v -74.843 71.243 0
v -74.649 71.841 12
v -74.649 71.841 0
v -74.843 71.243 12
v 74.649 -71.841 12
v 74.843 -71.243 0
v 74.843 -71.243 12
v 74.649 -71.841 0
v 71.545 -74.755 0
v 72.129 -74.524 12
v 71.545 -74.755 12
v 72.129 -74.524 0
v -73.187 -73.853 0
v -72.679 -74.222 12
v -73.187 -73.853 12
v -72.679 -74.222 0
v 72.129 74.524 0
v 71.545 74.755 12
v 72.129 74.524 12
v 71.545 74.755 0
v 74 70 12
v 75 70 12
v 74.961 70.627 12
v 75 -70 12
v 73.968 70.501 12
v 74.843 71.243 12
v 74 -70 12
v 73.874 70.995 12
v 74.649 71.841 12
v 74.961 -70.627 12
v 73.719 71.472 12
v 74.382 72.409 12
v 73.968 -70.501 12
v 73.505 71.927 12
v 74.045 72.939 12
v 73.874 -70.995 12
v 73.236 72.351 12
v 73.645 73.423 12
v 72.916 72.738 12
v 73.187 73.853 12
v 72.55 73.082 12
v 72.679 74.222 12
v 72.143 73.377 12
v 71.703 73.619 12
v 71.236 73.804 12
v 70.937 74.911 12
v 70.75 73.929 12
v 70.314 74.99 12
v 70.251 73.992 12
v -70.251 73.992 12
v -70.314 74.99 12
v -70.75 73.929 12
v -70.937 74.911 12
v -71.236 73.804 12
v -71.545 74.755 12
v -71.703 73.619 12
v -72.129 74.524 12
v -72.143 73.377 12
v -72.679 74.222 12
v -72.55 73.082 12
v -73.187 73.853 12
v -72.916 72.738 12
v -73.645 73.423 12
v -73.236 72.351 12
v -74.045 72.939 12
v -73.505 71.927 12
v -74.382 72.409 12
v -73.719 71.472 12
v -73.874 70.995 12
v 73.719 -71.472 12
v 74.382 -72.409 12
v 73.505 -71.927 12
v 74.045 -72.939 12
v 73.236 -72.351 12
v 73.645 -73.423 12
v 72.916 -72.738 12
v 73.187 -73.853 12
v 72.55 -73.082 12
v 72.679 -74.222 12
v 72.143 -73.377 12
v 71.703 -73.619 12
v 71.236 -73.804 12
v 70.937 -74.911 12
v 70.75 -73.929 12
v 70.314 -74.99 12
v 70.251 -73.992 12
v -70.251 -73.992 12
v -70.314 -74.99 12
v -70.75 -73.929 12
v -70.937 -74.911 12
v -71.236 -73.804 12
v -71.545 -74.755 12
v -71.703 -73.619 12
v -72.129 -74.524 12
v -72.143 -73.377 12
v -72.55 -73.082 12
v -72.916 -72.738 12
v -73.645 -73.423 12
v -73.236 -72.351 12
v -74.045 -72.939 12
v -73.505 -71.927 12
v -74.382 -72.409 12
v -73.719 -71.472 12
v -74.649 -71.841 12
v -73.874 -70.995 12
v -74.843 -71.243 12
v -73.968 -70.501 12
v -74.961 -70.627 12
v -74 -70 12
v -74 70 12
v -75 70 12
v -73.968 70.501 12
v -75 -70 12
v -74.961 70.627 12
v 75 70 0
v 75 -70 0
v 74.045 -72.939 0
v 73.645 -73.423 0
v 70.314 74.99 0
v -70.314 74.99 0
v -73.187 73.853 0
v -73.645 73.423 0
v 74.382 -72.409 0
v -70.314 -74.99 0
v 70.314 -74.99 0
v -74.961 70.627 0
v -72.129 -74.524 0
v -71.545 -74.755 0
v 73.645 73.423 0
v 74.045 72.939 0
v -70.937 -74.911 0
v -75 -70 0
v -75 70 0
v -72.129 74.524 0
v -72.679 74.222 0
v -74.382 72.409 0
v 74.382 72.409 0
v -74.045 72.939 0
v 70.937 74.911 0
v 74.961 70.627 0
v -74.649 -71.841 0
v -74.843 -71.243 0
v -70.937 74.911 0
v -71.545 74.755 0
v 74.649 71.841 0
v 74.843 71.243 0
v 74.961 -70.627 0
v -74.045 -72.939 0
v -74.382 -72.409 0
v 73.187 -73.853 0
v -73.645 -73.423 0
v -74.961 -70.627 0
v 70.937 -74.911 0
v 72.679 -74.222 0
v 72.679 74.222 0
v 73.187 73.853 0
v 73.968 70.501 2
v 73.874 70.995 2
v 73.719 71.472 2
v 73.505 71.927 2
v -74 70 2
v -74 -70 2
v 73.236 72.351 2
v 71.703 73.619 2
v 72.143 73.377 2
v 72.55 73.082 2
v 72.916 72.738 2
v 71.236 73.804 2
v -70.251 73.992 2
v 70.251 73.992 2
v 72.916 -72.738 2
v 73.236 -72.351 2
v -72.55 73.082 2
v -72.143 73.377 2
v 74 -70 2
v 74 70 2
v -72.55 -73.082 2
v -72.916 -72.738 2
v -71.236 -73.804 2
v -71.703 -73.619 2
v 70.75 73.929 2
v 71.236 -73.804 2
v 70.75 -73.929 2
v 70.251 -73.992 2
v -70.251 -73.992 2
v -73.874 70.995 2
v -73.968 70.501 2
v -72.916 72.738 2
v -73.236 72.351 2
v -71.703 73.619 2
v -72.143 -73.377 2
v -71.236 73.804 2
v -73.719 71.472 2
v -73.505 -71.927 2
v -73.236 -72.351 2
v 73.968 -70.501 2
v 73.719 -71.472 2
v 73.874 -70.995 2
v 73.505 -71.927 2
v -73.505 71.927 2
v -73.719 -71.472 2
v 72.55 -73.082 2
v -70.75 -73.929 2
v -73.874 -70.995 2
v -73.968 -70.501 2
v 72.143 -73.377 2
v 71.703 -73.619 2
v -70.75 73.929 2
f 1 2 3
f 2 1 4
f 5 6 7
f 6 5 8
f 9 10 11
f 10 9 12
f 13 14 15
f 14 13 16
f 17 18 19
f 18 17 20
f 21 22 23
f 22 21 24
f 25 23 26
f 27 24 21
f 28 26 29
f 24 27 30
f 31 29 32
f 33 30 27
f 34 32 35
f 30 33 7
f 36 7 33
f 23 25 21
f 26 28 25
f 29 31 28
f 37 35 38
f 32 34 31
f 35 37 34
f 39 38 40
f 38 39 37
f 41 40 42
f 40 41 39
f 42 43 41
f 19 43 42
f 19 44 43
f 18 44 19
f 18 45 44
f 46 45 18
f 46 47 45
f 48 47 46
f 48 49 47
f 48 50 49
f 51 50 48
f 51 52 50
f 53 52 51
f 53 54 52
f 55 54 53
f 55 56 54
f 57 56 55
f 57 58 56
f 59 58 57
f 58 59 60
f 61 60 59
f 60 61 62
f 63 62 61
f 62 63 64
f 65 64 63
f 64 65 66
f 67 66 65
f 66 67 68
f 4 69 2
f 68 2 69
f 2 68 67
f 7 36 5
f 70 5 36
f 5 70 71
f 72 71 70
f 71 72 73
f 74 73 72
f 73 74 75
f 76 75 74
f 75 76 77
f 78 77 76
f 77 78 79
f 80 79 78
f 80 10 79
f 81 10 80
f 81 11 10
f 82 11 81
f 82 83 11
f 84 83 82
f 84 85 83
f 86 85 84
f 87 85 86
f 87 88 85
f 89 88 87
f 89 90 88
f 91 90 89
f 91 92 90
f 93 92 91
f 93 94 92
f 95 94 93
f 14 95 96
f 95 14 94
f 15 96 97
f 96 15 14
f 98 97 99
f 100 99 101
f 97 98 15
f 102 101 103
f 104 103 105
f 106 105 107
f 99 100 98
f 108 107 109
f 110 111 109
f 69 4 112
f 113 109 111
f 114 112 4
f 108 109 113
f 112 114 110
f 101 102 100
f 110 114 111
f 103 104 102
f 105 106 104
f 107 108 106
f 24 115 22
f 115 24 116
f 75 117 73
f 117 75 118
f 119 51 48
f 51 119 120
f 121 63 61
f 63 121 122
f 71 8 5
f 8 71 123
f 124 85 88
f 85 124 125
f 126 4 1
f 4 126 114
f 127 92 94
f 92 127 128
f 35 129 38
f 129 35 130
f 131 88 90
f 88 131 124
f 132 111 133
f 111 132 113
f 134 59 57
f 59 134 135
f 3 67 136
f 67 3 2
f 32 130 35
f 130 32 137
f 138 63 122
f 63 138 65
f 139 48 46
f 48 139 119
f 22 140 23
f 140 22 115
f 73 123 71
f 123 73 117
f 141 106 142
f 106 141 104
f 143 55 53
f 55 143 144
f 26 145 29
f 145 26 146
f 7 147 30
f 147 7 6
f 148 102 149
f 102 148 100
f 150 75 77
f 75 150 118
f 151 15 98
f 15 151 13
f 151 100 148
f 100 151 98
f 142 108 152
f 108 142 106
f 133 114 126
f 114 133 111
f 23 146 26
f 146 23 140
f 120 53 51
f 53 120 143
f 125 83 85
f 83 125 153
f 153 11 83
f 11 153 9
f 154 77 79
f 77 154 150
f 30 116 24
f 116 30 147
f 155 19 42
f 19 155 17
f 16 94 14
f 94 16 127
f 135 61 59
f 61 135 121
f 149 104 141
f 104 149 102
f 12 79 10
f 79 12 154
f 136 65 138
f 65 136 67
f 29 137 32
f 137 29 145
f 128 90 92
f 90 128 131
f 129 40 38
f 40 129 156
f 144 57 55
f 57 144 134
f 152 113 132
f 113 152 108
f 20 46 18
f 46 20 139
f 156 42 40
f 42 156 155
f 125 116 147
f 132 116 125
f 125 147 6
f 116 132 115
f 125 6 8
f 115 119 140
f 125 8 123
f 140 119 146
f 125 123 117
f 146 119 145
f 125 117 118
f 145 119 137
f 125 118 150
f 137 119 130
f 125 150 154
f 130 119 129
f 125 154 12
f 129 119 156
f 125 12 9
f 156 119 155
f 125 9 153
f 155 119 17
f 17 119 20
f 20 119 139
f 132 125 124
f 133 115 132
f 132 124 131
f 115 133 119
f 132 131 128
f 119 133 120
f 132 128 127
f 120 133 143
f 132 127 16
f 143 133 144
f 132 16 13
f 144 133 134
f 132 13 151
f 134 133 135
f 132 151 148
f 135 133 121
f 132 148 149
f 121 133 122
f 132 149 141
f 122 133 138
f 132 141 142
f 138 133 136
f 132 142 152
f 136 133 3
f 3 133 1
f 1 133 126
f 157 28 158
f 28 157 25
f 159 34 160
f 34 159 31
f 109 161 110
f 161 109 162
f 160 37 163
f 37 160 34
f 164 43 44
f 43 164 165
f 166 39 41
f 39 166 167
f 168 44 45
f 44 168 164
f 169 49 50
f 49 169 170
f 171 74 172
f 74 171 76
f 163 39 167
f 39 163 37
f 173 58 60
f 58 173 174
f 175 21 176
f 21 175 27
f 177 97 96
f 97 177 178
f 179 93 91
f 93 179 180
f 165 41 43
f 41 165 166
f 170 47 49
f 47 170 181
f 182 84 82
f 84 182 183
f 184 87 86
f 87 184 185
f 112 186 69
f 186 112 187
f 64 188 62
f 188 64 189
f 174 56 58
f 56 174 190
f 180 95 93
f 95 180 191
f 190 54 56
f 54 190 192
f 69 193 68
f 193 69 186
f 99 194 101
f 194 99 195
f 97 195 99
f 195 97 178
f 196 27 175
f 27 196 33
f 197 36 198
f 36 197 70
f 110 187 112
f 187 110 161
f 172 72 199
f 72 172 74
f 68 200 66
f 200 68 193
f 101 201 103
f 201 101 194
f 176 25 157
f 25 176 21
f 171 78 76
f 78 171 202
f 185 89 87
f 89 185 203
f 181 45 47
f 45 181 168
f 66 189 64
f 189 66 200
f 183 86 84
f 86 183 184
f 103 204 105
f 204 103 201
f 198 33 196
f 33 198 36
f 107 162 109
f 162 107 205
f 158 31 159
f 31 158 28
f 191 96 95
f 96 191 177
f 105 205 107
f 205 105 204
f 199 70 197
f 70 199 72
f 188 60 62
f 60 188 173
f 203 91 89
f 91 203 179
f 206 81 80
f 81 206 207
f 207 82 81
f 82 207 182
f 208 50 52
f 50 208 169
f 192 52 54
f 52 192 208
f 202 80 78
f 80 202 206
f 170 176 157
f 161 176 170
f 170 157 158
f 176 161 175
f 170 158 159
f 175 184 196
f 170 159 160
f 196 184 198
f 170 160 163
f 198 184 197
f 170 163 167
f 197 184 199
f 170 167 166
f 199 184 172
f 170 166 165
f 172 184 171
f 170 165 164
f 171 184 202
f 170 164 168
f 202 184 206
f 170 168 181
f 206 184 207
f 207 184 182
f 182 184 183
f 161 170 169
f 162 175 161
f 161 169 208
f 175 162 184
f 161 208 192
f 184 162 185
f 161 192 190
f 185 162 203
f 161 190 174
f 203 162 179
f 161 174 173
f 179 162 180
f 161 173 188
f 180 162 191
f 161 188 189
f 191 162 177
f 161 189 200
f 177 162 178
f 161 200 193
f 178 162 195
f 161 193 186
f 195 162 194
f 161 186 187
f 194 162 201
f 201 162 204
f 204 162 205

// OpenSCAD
$fn = 50;


difference() {
	union() {
		hull() {
			translate(v = [-70.0000000000, 70.0000000000, 0]) {
				cylinder(h = 12, r = 5);
			}
			translate(v = [70.0000000000, 70.0000000000, 0]) {
				cylinder(h = 12, r = 5);
			}
			translate(v = [-70.0000000000, -70.0000000000, 0]) {
				cylinder(h = 12, r = 5);
			}
			translate(v = [70.0000000000, -70.0000000000, 0]) {
				cylinder(h = 12, r = 5);
			}
		}
	}
	union() {
		translate(v = [0, 0, 2]) {
			hull() {
				translate(v = [-70.0000000000, 70.0000000000, 0]) {
					cylinder(h = 10, r = 4);
				}
				translate(v = [70.0000000000, 70.0000000000, 0]) {
					cylinder(h = 10, r = 4);
				}
				translate(v = [-70.0000000000, -70.0000000000, 0]) {
					cylinder(h = 10, r = 4);
				}
				translate(v = [70.0000000000, -70.0000000000, 0]) {
					cylinder(h = 10, r = 4);
				}
			}
		}
	}
}
